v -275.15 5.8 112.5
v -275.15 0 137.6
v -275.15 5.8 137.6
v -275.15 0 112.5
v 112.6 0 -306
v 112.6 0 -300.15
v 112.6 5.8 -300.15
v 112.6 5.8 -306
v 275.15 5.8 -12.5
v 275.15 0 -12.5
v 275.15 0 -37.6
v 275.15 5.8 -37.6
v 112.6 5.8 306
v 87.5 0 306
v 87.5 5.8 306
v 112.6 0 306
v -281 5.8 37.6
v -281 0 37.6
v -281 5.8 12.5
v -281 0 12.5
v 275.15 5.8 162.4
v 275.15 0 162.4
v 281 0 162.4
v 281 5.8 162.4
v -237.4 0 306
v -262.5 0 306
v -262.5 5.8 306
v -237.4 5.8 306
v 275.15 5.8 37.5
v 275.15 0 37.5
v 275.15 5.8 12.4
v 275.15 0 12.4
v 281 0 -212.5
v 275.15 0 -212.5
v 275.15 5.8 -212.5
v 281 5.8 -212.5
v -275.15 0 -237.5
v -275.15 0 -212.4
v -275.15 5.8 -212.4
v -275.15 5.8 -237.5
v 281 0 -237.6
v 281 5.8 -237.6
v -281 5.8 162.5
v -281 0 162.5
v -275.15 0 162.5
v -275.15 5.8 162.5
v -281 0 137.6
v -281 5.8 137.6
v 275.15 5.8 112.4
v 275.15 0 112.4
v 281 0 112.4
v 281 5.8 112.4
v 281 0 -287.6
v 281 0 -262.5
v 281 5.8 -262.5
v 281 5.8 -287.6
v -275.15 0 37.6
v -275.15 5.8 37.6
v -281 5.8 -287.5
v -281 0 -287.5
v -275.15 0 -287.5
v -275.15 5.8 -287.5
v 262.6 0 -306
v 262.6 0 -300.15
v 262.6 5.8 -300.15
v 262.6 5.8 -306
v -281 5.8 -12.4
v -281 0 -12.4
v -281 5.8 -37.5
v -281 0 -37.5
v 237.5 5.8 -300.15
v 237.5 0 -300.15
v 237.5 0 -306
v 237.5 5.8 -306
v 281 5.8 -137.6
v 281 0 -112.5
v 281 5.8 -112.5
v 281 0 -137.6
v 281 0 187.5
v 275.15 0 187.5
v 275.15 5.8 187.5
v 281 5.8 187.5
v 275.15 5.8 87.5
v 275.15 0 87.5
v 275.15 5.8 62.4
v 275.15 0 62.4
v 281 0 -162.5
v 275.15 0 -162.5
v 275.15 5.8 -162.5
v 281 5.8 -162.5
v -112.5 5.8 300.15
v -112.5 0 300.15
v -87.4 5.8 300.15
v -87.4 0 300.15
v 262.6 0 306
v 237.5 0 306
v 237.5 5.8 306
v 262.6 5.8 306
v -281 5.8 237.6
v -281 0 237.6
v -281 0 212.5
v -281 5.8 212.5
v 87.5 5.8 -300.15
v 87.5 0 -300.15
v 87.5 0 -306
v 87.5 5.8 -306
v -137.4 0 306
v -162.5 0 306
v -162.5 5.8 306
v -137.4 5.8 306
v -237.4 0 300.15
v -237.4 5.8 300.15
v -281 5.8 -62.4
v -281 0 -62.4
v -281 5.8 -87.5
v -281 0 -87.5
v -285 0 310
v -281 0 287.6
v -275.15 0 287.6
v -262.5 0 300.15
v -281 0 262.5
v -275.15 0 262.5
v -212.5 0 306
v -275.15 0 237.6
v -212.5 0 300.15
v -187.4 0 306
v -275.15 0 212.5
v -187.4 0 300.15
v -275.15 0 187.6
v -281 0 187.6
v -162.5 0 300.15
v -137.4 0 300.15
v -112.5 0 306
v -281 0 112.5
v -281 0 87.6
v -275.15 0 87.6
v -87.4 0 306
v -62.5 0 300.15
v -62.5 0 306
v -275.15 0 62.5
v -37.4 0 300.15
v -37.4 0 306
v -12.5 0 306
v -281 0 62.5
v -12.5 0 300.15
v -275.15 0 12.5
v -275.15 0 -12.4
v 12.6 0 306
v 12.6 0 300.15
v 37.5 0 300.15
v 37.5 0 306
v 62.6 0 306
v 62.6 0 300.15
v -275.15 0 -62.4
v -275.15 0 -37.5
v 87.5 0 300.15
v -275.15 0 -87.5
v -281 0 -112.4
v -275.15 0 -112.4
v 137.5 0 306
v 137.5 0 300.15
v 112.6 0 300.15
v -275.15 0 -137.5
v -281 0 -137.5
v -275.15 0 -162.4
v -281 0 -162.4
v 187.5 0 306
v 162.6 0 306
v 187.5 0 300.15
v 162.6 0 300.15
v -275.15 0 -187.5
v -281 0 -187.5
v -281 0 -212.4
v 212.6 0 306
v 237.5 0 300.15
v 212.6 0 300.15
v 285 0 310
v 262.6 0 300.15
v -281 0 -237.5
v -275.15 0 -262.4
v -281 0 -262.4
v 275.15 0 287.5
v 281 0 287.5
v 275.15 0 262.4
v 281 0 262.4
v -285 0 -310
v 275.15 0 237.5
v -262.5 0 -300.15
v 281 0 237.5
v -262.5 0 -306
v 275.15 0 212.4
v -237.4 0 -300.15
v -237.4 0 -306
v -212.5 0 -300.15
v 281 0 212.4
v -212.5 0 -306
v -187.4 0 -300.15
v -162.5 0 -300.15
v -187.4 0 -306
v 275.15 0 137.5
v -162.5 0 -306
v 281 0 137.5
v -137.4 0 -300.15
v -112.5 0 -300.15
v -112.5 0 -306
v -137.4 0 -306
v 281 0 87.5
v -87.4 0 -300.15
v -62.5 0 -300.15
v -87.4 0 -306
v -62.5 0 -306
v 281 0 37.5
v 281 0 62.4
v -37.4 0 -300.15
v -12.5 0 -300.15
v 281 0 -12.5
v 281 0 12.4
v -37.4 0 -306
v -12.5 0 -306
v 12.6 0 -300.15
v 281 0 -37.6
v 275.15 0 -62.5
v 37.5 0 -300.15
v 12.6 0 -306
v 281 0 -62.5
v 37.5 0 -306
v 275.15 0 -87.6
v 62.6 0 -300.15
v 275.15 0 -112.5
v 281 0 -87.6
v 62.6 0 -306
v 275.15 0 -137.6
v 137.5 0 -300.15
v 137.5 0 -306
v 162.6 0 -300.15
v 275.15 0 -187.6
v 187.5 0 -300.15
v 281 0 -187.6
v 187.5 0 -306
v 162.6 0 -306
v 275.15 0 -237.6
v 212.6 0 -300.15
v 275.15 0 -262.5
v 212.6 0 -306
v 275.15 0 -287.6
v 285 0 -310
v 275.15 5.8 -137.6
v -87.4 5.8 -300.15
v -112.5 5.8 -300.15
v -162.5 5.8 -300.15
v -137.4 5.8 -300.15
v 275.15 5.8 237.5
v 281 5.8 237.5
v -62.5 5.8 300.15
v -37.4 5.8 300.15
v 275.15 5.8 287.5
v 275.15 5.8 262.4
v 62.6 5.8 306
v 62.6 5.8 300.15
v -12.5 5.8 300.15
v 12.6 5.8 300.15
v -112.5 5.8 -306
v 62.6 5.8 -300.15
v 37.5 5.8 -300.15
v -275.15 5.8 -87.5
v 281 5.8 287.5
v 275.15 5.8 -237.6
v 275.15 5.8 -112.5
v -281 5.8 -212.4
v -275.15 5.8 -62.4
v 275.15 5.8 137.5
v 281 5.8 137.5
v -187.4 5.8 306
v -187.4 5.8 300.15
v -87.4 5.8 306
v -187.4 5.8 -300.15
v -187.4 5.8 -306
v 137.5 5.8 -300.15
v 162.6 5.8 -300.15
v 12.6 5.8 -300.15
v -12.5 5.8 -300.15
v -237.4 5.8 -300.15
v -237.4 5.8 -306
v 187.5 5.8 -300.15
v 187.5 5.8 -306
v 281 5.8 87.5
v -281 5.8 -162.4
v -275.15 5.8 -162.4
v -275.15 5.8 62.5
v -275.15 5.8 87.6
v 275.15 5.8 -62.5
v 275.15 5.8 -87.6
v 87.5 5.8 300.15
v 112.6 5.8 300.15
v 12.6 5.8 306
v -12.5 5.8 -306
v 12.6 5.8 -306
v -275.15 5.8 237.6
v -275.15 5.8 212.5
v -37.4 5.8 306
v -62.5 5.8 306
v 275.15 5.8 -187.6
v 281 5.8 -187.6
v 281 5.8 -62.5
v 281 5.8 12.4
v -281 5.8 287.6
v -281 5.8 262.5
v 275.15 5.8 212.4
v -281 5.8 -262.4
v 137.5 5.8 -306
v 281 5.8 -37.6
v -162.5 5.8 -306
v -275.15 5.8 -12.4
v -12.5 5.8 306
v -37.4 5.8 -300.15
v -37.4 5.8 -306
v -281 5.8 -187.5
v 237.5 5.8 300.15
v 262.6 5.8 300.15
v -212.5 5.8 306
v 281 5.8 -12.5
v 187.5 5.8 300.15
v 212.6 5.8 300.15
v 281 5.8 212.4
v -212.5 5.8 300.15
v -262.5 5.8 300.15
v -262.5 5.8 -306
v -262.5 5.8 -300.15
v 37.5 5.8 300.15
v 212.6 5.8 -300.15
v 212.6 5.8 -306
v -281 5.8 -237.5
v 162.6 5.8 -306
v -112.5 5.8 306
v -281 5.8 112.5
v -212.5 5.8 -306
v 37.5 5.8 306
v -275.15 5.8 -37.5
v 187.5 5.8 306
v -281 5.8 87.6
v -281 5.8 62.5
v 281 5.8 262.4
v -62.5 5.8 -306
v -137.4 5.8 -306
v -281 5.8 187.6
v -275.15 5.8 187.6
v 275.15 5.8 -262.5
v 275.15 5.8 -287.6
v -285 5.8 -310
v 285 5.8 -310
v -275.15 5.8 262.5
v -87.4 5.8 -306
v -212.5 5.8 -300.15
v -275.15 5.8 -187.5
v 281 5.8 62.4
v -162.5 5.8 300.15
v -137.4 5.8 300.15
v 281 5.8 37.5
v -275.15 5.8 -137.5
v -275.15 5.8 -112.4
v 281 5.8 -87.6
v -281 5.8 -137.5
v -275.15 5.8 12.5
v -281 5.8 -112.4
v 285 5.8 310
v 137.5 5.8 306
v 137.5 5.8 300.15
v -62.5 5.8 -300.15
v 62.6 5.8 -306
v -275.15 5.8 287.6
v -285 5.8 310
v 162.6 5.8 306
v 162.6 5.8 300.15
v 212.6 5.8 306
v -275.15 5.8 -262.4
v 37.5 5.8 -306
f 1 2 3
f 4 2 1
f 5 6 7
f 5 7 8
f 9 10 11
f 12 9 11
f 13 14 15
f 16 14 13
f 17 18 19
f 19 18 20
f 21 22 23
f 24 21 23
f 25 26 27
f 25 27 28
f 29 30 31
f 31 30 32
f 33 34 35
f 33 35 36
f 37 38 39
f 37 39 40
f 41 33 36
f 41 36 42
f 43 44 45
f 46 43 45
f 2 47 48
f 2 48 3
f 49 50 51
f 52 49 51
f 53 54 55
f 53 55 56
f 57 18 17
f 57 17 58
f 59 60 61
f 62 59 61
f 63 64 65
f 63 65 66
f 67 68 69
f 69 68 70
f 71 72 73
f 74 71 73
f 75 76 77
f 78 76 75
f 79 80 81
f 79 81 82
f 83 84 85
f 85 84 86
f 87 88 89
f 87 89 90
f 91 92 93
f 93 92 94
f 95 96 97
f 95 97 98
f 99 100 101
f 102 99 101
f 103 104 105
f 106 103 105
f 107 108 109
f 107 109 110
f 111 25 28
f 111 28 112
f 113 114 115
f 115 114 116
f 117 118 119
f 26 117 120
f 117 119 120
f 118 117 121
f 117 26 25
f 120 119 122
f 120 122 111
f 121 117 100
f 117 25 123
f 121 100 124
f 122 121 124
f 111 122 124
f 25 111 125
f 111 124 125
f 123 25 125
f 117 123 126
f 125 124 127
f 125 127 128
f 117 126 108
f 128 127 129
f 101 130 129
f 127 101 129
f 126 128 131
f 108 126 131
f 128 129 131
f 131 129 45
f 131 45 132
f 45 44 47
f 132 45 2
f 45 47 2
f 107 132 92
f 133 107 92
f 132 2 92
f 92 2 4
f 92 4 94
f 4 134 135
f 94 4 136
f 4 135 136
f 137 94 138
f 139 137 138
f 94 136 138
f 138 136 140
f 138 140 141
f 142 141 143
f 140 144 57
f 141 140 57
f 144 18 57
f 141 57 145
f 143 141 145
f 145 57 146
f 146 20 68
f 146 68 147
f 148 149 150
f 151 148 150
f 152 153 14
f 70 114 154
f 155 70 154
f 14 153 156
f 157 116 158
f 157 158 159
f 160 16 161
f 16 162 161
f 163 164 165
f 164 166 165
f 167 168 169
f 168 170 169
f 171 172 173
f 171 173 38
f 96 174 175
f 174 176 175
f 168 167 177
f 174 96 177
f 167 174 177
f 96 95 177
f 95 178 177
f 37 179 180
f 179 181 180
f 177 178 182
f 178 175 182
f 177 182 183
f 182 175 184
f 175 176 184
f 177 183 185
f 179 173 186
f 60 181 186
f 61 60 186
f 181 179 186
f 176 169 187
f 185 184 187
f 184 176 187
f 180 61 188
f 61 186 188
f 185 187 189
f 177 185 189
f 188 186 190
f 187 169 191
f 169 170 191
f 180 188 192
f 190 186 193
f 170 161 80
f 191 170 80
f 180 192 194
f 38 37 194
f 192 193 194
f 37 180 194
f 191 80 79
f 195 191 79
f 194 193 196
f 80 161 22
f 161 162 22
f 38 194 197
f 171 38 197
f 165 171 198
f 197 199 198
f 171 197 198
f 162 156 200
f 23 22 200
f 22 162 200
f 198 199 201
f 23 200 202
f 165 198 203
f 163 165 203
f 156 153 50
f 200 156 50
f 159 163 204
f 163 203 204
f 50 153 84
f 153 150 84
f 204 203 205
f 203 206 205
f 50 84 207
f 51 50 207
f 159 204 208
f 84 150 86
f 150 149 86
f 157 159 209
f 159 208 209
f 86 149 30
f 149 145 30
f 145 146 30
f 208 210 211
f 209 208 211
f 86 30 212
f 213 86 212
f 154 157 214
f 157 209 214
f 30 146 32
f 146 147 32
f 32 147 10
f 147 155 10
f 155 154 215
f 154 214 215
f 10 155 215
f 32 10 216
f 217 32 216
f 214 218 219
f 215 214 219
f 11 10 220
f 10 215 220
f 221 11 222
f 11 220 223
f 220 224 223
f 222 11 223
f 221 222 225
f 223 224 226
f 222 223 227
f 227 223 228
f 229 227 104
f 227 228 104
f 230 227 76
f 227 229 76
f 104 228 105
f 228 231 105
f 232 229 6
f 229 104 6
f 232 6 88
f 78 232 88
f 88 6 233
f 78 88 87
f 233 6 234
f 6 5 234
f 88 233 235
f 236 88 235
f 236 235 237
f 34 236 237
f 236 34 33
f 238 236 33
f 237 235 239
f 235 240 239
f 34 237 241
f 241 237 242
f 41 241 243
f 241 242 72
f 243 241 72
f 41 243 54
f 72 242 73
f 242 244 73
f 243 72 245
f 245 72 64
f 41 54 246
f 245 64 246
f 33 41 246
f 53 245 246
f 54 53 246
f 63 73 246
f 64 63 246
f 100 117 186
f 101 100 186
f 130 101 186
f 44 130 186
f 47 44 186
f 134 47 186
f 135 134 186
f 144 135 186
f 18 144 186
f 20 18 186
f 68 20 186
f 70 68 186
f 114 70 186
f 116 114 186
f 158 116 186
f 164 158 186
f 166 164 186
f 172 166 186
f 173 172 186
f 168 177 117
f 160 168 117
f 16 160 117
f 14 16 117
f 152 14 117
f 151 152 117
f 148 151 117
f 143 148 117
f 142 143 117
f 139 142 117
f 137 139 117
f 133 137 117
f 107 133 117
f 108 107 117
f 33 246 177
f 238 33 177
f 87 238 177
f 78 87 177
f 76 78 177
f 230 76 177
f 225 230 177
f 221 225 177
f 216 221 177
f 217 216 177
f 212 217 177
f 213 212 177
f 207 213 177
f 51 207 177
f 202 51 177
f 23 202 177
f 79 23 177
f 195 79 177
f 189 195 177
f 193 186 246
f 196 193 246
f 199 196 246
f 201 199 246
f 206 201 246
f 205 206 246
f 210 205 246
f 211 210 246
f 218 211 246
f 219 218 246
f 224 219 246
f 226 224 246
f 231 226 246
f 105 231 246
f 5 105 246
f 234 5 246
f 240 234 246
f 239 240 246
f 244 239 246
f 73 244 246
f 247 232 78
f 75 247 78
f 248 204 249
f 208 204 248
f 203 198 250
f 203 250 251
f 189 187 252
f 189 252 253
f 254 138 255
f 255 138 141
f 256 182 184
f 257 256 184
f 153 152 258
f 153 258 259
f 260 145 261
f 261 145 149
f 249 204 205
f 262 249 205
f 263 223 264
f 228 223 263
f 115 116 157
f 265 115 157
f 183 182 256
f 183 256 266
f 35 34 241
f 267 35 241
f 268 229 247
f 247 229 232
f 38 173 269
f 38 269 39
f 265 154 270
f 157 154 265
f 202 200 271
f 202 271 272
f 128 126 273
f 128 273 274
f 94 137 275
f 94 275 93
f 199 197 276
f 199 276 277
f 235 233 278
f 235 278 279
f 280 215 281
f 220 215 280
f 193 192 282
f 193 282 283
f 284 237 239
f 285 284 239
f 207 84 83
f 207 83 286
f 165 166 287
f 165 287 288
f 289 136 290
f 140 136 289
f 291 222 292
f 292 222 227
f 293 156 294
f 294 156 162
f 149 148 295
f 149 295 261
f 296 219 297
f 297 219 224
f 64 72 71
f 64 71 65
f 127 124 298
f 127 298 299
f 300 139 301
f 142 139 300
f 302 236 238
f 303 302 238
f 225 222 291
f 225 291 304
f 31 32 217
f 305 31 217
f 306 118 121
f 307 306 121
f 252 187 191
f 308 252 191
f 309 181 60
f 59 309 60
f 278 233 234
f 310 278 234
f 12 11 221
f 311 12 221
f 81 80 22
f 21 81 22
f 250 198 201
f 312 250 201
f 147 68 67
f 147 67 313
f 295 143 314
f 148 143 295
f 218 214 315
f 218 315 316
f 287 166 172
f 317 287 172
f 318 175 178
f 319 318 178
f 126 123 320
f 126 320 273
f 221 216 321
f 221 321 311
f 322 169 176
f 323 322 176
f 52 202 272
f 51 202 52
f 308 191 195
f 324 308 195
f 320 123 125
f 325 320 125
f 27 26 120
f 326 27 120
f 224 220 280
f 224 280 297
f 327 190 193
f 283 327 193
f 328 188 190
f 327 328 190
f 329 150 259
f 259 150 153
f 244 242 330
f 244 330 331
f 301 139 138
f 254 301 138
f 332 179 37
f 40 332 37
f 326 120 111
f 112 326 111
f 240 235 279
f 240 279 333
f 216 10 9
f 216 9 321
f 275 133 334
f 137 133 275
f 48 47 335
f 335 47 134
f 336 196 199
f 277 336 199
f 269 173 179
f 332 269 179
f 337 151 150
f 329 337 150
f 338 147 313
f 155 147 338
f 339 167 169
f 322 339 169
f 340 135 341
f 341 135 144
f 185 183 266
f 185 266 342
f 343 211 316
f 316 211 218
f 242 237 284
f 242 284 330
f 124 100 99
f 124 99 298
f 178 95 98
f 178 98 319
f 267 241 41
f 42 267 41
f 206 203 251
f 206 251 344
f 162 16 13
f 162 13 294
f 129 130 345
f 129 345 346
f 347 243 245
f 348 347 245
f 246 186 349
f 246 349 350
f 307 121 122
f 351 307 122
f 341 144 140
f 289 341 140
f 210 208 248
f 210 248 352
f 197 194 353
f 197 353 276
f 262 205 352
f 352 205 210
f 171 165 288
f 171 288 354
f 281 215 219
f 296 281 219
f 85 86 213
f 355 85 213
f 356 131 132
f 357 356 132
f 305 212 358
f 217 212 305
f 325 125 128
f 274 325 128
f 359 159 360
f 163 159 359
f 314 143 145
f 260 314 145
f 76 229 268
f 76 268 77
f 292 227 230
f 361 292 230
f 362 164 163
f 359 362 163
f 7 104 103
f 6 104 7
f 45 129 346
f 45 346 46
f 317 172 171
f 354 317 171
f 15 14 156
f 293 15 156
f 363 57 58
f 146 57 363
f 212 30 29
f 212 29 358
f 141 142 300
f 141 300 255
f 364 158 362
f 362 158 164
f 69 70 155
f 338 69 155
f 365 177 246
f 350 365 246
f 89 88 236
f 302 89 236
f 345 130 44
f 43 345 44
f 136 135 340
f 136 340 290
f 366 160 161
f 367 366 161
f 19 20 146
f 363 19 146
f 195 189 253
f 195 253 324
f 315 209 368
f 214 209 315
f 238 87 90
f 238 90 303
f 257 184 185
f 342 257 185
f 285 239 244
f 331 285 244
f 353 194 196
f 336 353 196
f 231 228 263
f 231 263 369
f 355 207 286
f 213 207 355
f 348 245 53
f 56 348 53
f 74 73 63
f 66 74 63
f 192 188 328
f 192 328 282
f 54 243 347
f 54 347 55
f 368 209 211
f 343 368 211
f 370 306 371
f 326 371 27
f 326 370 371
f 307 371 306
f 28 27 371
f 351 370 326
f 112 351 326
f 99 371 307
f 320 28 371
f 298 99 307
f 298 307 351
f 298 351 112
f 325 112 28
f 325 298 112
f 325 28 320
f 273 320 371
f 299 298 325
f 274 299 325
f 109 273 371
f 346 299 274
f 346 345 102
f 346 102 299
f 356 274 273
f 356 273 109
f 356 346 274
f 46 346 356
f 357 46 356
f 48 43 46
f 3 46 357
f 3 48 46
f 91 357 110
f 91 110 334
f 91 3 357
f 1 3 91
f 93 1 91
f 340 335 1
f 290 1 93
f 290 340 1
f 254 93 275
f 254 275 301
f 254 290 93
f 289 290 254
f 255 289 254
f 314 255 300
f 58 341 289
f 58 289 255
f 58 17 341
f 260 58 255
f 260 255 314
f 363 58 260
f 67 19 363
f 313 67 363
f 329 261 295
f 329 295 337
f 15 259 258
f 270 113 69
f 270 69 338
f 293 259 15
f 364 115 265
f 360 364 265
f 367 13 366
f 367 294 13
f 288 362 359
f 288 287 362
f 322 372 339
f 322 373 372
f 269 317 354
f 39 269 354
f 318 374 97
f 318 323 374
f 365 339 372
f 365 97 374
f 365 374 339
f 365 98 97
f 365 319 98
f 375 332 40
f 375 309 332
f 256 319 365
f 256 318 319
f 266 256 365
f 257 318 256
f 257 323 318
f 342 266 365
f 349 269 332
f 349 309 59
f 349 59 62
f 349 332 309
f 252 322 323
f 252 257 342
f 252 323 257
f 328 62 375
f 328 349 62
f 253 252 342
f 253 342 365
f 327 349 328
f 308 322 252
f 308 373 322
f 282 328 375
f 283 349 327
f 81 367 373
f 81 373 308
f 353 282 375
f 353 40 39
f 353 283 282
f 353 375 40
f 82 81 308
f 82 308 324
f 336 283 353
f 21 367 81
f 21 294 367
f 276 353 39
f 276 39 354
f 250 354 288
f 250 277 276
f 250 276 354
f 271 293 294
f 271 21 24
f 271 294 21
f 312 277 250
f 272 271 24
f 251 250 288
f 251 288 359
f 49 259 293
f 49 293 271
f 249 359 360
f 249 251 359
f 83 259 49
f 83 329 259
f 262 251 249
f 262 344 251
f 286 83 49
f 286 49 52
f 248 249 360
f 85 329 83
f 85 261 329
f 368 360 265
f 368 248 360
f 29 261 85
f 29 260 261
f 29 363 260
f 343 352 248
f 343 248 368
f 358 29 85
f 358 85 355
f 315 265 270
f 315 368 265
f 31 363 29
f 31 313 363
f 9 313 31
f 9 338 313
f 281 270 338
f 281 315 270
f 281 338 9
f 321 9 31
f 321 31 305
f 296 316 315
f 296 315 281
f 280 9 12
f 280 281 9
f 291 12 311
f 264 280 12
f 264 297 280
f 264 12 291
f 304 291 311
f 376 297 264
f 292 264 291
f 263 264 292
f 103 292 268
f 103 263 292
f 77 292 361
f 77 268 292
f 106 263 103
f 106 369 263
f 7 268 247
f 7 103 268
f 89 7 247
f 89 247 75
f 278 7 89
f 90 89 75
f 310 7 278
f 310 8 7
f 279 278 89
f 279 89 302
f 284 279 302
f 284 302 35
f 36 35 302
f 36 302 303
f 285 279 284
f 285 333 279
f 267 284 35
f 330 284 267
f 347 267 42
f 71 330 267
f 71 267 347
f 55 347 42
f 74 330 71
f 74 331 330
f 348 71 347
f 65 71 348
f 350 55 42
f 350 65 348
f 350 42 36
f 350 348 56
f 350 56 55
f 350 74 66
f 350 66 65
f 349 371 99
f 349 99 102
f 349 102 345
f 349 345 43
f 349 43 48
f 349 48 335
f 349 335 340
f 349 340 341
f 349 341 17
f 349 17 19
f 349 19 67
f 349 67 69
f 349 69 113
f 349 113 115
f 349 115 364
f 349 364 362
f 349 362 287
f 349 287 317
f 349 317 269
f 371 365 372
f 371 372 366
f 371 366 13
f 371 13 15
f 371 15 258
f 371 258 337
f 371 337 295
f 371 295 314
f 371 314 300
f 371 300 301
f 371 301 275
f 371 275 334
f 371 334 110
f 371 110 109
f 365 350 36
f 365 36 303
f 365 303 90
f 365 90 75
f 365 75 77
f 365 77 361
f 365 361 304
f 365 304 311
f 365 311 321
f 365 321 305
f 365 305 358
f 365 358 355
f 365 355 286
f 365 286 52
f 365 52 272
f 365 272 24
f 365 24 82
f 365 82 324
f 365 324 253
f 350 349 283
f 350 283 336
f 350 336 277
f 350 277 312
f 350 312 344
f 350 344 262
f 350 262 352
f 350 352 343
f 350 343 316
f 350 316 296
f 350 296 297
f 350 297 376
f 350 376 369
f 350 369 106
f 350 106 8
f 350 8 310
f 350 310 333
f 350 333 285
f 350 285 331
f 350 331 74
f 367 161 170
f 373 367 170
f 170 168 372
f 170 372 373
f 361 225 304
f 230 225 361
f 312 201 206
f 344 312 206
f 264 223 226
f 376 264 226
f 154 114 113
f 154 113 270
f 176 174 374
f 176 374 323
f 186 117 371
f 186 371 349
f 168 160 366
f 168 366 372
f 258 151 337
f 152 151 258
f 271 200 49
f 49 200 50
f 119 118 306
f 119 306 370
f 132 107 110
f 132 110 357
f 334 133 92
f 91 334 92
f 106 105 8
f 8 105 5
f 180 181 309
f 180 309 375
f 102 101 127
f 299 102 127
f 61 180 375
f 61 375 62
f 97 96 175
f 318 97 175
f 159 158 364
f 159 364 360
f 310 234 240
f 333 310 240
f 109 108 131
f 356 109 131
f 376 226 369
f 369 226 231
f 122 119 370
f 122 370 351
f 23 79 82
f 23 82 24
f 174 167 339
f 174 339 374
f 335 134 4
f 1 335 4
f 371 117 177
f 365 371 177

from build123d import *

# Parameters (mm, degrees)
SKETCH1_W           = 570
SKETCH1_H           = 620
SKETCH1_W_2         = 25.1
SKETCH1_H_2         = 5.85
SKETCH1_W_3         = 5.85
SKETCH1_H_3         = 25.1
BOSS_EXTRUDE1_DEPTH = 5.8


with BuildPart() as part:
    # Sketch1 → Boss-Extrude1 (new body)
    with BuildSketch(Plane(origin=(0, 0, 0), x_dir=(1, 0, 0), z_dir=(0, 1, 0))):
        Rectangle(SKETCH1_W, SKETCH1_H)
        with Locations((-199.95, 303.075)):
            Rectangle(SKETCH1_W_2, SKETCH1_H_2, mode=Mode.SUBTRACT)
        with Locations((-249.95, 303.075)):
            Rectangle(SKETCH1_W_2, SKETCH1_H_2, mode=Mode.SUBTRACT)
        with Locations((-149.95, 303.075)):
            Rectangle(SKETCH1_W_2, SKETCH1_H_2, mode=Mode.SUBTRACT)
        with Locations((-99.95, 303.075)):
            Rectangle(SKETCH1_W_2, SKETCH1_H_2, mode=Mode.SUBTRACT)
        with Locations((-49.95, 303.075)):
            Rectangle(SKETCH1_W_2, SKETCH1_H_2, mode=Mode.SUBTRACT)
        with Locations((0.05, 303.075)):
            Rectangle(SKETCH1_W_2, SKETCH1_H_2, mode=Mode.SUBTRACT)
        with Locations((50.05, 303.075)):
            Rectangle(SKETCH1_W_2, SKETCH1_H_2, mode=Mode.SUBTRACT)
        with Locations((100.05, 303.075)):
            Rectangle(SKETCH1_W_2, SKETCH1_H_2, mode=Mode.SUBTRACT)
        with Locations((150.05, 303.075)):
            Rectangle(SKETCH1_W_2, SKETCH1_H_2, mode=Mode.SUBTRACT)
        with Locations((200.05, 303.075)):
            Rectangle(SKETCH1_W_2, SKETCH1_H_2, mode=Mode.SUBTRACT)
        with Locations((250.05, 303.075)):
            Rectangle(SKETCH1_W_2, SKETCH1_H_2, mode=Mode.SUBTRACT)
        with Locations((250.05, -303.075)):
            Rectangle(SKETCH1_W_2, SKETCH1_H_2, mode=Mode.SUBTRACT)
        with Locations((200.05, -303.075)):
            Rectangle(SKETCH1_W_2, SKETCH1_H_2, mode=Mode.SUBTRACT)
        with Locations((150.05, -303.075)):
            Rectangle(SKETCH1_W_2, SKETCH1_H_2, mode=Mode.SUBTRACT)
        with Locations((100.05, -303.075)):
            Rectangle(SKETCH1_W_2, SKETCH1_H_2, mode=Mode.SUBTRACT)
        with Locations((50.05, -303.075)):
            Rectangle(SKETCH1_W_2, SKETCH1_H_2, mode=Mode.SUBTRACT)
        with Locations((0.05, -303.075)):
            Rectangle(SKETCH1_W_2, SKETCH1_H_2, mode=Mode.SUBTRACT)
        with Locations((-49.95, -303.075)):
            Rectangle(SKETCH1_W_2, SKETCH1_H_2, mode=Mode.SUBTRACT)
        with Locations((-99.95, -303.075)):
            Rectangle(SKETCH1_W_2, SKETCH1_H_2, mode=Mode.SUBTRACT)
        with Locations((-149.95, -303.075)):
            Rectangle(SKETCH1_W_2, SKETCH1_H_2, mode=Mode.SUBTRACT)
        with Locations((-199.95, -303.075)):
            Rectangle(SKETCH1_W_2, SKETCH1_H_2, mode=Mode.SUBTRACT)
        with Locations((-249.95, -303.075)):
            Rectangle(SKETCH1_W_2, SKETCH1_H_2, mode=Mode.SUBTRACT)
        with Locations((-278.075, 224.95)):
            Rectangle(SKETCH1_W_3, SKETCH1_H_3, mode=Mode.SUBTRACT)
        with Locations((-278.075, 274.95)):
            Rectangle(SKETCH1_W_3, SKETCH1_H_3, mode=Mode.SUBTRACT)
        with Locations((-278.075, 174.95)):
            Rectangle(SKETCH1_W_3, SKETCH1_H_3, mode=Mode.SUBTRACT)
        with Locations((-278.075, 124.95)):
            Rectangle(SKETCH1_W_3, SKETCH1_H_3, mode=Mode.SUBTRACT)
        with Locations((-278.075, 74.95)):
            Rectangle(SKETCH1_W_3, SKETCH1_H_3, mode=Mode.SUBTRACT)
        with Locations((-278.075, 24.95)):
            Rectangle(SKETCH1_W_3, SKETCH1_H_3, mode=Mode.SUBTRACT)
        with Locations((-278.075, -25.05)):
            Rectangle(SKETCH1_W_3, SKETCH1_H_3, mode=Mode.SUBTRACT)
        with Locations((-278.075, -75.05)):
            Rectangle(SKETCH1_W_3, SKETCH1_H_3, mode=Mode.SUBTRACT)
        with Locations((-278.075, -125.05)):
            Rectangle(SKETCH1_W_3, SKETCH1_H_3, mode=Mode.SUBTRACT)
        with Locations((-278.075, -175.05)):
            Rectangle(SKETCH1_W_3, SKETCH1_H_3, mode=Mode.SUBTRACT)
        with Locations((-278.075, -225.05)):
            Rectangle(SKETCH1_W_3, SKETCH1_H_3, mode=Mode.SUBTRACT)
        with Locations((-278.075, -275.05)):
            Rectangle(SKETCH1_W_3, SKETCH1_H_3, mode=Mode.SUBTRACT)
        with Locations((278.075, -274.95)):
            Rectangle(SKETCH1_W_3, SKETCH1_H_3, mode=Mode.SUBTRACT)
        with Locations((278.075, -224.95)):
            Rectangle(SKETCH1_W_3, SKETCH1_H_3, mode=Mode.SUBTRACT)
        with Locations((278.075, -174.95)):
            Rectangle(SKETCH1_W_3, SKETCH1_H_3, mode=Mode.SUBTRACT)
        with Locations((278.075, -124.95)):
            Rectangle(SKETCH1_W_3, SKETCH1_H_3, mode=Mode.SUBTRACT)
        with Locations((278.075, -74.95)):
            Rectangle(SKETCH1_W_3, SKETCH1_H_3, mode=Mode.SUBTRACT)
        with Locations((278.075, -24.95)):
            Rectangle(SKETCH1_W_3, SKETCH1_H_3, mode=Mode.SUBTRACT)
        with Locations((278.075, 25.05)):
            Rectangle(SKETCH1_W_3, SKETCH1_H_3, mode=Mode.SUBTRACT)
        with Locations((278.075, 75.05)):
            Rectangle(SKETCH1_W_3, SKETCH1_H_3, mode=Mode.SUBTRACT)
        with Locations((278.075, 125.05)):
            Rectangle(SKETCH1_W_3, SKETCH1_H_3, mode=Mode.SUBTRACT)
        with Locations((278.075, 175.05)):
            Rectangle(SKETCH1_W_3, SKETCH1_H_3, mode=Mode.SUBTRACT)
        with Locations((278.075, 225.05)):
            Rectangle(SKETCH1_W_3, SKETCH1_H_3, mode=Mode.SUBTRACT)
        with Locations((278.075, 275.05)):
            Rectangle(SKETCH1_W_3, SKETCH1_H_3, mode=Mode.SUBTRACT)
    extrude(amount=BOSS_EXTRUDE1_DEPTH)


solid = part.part
